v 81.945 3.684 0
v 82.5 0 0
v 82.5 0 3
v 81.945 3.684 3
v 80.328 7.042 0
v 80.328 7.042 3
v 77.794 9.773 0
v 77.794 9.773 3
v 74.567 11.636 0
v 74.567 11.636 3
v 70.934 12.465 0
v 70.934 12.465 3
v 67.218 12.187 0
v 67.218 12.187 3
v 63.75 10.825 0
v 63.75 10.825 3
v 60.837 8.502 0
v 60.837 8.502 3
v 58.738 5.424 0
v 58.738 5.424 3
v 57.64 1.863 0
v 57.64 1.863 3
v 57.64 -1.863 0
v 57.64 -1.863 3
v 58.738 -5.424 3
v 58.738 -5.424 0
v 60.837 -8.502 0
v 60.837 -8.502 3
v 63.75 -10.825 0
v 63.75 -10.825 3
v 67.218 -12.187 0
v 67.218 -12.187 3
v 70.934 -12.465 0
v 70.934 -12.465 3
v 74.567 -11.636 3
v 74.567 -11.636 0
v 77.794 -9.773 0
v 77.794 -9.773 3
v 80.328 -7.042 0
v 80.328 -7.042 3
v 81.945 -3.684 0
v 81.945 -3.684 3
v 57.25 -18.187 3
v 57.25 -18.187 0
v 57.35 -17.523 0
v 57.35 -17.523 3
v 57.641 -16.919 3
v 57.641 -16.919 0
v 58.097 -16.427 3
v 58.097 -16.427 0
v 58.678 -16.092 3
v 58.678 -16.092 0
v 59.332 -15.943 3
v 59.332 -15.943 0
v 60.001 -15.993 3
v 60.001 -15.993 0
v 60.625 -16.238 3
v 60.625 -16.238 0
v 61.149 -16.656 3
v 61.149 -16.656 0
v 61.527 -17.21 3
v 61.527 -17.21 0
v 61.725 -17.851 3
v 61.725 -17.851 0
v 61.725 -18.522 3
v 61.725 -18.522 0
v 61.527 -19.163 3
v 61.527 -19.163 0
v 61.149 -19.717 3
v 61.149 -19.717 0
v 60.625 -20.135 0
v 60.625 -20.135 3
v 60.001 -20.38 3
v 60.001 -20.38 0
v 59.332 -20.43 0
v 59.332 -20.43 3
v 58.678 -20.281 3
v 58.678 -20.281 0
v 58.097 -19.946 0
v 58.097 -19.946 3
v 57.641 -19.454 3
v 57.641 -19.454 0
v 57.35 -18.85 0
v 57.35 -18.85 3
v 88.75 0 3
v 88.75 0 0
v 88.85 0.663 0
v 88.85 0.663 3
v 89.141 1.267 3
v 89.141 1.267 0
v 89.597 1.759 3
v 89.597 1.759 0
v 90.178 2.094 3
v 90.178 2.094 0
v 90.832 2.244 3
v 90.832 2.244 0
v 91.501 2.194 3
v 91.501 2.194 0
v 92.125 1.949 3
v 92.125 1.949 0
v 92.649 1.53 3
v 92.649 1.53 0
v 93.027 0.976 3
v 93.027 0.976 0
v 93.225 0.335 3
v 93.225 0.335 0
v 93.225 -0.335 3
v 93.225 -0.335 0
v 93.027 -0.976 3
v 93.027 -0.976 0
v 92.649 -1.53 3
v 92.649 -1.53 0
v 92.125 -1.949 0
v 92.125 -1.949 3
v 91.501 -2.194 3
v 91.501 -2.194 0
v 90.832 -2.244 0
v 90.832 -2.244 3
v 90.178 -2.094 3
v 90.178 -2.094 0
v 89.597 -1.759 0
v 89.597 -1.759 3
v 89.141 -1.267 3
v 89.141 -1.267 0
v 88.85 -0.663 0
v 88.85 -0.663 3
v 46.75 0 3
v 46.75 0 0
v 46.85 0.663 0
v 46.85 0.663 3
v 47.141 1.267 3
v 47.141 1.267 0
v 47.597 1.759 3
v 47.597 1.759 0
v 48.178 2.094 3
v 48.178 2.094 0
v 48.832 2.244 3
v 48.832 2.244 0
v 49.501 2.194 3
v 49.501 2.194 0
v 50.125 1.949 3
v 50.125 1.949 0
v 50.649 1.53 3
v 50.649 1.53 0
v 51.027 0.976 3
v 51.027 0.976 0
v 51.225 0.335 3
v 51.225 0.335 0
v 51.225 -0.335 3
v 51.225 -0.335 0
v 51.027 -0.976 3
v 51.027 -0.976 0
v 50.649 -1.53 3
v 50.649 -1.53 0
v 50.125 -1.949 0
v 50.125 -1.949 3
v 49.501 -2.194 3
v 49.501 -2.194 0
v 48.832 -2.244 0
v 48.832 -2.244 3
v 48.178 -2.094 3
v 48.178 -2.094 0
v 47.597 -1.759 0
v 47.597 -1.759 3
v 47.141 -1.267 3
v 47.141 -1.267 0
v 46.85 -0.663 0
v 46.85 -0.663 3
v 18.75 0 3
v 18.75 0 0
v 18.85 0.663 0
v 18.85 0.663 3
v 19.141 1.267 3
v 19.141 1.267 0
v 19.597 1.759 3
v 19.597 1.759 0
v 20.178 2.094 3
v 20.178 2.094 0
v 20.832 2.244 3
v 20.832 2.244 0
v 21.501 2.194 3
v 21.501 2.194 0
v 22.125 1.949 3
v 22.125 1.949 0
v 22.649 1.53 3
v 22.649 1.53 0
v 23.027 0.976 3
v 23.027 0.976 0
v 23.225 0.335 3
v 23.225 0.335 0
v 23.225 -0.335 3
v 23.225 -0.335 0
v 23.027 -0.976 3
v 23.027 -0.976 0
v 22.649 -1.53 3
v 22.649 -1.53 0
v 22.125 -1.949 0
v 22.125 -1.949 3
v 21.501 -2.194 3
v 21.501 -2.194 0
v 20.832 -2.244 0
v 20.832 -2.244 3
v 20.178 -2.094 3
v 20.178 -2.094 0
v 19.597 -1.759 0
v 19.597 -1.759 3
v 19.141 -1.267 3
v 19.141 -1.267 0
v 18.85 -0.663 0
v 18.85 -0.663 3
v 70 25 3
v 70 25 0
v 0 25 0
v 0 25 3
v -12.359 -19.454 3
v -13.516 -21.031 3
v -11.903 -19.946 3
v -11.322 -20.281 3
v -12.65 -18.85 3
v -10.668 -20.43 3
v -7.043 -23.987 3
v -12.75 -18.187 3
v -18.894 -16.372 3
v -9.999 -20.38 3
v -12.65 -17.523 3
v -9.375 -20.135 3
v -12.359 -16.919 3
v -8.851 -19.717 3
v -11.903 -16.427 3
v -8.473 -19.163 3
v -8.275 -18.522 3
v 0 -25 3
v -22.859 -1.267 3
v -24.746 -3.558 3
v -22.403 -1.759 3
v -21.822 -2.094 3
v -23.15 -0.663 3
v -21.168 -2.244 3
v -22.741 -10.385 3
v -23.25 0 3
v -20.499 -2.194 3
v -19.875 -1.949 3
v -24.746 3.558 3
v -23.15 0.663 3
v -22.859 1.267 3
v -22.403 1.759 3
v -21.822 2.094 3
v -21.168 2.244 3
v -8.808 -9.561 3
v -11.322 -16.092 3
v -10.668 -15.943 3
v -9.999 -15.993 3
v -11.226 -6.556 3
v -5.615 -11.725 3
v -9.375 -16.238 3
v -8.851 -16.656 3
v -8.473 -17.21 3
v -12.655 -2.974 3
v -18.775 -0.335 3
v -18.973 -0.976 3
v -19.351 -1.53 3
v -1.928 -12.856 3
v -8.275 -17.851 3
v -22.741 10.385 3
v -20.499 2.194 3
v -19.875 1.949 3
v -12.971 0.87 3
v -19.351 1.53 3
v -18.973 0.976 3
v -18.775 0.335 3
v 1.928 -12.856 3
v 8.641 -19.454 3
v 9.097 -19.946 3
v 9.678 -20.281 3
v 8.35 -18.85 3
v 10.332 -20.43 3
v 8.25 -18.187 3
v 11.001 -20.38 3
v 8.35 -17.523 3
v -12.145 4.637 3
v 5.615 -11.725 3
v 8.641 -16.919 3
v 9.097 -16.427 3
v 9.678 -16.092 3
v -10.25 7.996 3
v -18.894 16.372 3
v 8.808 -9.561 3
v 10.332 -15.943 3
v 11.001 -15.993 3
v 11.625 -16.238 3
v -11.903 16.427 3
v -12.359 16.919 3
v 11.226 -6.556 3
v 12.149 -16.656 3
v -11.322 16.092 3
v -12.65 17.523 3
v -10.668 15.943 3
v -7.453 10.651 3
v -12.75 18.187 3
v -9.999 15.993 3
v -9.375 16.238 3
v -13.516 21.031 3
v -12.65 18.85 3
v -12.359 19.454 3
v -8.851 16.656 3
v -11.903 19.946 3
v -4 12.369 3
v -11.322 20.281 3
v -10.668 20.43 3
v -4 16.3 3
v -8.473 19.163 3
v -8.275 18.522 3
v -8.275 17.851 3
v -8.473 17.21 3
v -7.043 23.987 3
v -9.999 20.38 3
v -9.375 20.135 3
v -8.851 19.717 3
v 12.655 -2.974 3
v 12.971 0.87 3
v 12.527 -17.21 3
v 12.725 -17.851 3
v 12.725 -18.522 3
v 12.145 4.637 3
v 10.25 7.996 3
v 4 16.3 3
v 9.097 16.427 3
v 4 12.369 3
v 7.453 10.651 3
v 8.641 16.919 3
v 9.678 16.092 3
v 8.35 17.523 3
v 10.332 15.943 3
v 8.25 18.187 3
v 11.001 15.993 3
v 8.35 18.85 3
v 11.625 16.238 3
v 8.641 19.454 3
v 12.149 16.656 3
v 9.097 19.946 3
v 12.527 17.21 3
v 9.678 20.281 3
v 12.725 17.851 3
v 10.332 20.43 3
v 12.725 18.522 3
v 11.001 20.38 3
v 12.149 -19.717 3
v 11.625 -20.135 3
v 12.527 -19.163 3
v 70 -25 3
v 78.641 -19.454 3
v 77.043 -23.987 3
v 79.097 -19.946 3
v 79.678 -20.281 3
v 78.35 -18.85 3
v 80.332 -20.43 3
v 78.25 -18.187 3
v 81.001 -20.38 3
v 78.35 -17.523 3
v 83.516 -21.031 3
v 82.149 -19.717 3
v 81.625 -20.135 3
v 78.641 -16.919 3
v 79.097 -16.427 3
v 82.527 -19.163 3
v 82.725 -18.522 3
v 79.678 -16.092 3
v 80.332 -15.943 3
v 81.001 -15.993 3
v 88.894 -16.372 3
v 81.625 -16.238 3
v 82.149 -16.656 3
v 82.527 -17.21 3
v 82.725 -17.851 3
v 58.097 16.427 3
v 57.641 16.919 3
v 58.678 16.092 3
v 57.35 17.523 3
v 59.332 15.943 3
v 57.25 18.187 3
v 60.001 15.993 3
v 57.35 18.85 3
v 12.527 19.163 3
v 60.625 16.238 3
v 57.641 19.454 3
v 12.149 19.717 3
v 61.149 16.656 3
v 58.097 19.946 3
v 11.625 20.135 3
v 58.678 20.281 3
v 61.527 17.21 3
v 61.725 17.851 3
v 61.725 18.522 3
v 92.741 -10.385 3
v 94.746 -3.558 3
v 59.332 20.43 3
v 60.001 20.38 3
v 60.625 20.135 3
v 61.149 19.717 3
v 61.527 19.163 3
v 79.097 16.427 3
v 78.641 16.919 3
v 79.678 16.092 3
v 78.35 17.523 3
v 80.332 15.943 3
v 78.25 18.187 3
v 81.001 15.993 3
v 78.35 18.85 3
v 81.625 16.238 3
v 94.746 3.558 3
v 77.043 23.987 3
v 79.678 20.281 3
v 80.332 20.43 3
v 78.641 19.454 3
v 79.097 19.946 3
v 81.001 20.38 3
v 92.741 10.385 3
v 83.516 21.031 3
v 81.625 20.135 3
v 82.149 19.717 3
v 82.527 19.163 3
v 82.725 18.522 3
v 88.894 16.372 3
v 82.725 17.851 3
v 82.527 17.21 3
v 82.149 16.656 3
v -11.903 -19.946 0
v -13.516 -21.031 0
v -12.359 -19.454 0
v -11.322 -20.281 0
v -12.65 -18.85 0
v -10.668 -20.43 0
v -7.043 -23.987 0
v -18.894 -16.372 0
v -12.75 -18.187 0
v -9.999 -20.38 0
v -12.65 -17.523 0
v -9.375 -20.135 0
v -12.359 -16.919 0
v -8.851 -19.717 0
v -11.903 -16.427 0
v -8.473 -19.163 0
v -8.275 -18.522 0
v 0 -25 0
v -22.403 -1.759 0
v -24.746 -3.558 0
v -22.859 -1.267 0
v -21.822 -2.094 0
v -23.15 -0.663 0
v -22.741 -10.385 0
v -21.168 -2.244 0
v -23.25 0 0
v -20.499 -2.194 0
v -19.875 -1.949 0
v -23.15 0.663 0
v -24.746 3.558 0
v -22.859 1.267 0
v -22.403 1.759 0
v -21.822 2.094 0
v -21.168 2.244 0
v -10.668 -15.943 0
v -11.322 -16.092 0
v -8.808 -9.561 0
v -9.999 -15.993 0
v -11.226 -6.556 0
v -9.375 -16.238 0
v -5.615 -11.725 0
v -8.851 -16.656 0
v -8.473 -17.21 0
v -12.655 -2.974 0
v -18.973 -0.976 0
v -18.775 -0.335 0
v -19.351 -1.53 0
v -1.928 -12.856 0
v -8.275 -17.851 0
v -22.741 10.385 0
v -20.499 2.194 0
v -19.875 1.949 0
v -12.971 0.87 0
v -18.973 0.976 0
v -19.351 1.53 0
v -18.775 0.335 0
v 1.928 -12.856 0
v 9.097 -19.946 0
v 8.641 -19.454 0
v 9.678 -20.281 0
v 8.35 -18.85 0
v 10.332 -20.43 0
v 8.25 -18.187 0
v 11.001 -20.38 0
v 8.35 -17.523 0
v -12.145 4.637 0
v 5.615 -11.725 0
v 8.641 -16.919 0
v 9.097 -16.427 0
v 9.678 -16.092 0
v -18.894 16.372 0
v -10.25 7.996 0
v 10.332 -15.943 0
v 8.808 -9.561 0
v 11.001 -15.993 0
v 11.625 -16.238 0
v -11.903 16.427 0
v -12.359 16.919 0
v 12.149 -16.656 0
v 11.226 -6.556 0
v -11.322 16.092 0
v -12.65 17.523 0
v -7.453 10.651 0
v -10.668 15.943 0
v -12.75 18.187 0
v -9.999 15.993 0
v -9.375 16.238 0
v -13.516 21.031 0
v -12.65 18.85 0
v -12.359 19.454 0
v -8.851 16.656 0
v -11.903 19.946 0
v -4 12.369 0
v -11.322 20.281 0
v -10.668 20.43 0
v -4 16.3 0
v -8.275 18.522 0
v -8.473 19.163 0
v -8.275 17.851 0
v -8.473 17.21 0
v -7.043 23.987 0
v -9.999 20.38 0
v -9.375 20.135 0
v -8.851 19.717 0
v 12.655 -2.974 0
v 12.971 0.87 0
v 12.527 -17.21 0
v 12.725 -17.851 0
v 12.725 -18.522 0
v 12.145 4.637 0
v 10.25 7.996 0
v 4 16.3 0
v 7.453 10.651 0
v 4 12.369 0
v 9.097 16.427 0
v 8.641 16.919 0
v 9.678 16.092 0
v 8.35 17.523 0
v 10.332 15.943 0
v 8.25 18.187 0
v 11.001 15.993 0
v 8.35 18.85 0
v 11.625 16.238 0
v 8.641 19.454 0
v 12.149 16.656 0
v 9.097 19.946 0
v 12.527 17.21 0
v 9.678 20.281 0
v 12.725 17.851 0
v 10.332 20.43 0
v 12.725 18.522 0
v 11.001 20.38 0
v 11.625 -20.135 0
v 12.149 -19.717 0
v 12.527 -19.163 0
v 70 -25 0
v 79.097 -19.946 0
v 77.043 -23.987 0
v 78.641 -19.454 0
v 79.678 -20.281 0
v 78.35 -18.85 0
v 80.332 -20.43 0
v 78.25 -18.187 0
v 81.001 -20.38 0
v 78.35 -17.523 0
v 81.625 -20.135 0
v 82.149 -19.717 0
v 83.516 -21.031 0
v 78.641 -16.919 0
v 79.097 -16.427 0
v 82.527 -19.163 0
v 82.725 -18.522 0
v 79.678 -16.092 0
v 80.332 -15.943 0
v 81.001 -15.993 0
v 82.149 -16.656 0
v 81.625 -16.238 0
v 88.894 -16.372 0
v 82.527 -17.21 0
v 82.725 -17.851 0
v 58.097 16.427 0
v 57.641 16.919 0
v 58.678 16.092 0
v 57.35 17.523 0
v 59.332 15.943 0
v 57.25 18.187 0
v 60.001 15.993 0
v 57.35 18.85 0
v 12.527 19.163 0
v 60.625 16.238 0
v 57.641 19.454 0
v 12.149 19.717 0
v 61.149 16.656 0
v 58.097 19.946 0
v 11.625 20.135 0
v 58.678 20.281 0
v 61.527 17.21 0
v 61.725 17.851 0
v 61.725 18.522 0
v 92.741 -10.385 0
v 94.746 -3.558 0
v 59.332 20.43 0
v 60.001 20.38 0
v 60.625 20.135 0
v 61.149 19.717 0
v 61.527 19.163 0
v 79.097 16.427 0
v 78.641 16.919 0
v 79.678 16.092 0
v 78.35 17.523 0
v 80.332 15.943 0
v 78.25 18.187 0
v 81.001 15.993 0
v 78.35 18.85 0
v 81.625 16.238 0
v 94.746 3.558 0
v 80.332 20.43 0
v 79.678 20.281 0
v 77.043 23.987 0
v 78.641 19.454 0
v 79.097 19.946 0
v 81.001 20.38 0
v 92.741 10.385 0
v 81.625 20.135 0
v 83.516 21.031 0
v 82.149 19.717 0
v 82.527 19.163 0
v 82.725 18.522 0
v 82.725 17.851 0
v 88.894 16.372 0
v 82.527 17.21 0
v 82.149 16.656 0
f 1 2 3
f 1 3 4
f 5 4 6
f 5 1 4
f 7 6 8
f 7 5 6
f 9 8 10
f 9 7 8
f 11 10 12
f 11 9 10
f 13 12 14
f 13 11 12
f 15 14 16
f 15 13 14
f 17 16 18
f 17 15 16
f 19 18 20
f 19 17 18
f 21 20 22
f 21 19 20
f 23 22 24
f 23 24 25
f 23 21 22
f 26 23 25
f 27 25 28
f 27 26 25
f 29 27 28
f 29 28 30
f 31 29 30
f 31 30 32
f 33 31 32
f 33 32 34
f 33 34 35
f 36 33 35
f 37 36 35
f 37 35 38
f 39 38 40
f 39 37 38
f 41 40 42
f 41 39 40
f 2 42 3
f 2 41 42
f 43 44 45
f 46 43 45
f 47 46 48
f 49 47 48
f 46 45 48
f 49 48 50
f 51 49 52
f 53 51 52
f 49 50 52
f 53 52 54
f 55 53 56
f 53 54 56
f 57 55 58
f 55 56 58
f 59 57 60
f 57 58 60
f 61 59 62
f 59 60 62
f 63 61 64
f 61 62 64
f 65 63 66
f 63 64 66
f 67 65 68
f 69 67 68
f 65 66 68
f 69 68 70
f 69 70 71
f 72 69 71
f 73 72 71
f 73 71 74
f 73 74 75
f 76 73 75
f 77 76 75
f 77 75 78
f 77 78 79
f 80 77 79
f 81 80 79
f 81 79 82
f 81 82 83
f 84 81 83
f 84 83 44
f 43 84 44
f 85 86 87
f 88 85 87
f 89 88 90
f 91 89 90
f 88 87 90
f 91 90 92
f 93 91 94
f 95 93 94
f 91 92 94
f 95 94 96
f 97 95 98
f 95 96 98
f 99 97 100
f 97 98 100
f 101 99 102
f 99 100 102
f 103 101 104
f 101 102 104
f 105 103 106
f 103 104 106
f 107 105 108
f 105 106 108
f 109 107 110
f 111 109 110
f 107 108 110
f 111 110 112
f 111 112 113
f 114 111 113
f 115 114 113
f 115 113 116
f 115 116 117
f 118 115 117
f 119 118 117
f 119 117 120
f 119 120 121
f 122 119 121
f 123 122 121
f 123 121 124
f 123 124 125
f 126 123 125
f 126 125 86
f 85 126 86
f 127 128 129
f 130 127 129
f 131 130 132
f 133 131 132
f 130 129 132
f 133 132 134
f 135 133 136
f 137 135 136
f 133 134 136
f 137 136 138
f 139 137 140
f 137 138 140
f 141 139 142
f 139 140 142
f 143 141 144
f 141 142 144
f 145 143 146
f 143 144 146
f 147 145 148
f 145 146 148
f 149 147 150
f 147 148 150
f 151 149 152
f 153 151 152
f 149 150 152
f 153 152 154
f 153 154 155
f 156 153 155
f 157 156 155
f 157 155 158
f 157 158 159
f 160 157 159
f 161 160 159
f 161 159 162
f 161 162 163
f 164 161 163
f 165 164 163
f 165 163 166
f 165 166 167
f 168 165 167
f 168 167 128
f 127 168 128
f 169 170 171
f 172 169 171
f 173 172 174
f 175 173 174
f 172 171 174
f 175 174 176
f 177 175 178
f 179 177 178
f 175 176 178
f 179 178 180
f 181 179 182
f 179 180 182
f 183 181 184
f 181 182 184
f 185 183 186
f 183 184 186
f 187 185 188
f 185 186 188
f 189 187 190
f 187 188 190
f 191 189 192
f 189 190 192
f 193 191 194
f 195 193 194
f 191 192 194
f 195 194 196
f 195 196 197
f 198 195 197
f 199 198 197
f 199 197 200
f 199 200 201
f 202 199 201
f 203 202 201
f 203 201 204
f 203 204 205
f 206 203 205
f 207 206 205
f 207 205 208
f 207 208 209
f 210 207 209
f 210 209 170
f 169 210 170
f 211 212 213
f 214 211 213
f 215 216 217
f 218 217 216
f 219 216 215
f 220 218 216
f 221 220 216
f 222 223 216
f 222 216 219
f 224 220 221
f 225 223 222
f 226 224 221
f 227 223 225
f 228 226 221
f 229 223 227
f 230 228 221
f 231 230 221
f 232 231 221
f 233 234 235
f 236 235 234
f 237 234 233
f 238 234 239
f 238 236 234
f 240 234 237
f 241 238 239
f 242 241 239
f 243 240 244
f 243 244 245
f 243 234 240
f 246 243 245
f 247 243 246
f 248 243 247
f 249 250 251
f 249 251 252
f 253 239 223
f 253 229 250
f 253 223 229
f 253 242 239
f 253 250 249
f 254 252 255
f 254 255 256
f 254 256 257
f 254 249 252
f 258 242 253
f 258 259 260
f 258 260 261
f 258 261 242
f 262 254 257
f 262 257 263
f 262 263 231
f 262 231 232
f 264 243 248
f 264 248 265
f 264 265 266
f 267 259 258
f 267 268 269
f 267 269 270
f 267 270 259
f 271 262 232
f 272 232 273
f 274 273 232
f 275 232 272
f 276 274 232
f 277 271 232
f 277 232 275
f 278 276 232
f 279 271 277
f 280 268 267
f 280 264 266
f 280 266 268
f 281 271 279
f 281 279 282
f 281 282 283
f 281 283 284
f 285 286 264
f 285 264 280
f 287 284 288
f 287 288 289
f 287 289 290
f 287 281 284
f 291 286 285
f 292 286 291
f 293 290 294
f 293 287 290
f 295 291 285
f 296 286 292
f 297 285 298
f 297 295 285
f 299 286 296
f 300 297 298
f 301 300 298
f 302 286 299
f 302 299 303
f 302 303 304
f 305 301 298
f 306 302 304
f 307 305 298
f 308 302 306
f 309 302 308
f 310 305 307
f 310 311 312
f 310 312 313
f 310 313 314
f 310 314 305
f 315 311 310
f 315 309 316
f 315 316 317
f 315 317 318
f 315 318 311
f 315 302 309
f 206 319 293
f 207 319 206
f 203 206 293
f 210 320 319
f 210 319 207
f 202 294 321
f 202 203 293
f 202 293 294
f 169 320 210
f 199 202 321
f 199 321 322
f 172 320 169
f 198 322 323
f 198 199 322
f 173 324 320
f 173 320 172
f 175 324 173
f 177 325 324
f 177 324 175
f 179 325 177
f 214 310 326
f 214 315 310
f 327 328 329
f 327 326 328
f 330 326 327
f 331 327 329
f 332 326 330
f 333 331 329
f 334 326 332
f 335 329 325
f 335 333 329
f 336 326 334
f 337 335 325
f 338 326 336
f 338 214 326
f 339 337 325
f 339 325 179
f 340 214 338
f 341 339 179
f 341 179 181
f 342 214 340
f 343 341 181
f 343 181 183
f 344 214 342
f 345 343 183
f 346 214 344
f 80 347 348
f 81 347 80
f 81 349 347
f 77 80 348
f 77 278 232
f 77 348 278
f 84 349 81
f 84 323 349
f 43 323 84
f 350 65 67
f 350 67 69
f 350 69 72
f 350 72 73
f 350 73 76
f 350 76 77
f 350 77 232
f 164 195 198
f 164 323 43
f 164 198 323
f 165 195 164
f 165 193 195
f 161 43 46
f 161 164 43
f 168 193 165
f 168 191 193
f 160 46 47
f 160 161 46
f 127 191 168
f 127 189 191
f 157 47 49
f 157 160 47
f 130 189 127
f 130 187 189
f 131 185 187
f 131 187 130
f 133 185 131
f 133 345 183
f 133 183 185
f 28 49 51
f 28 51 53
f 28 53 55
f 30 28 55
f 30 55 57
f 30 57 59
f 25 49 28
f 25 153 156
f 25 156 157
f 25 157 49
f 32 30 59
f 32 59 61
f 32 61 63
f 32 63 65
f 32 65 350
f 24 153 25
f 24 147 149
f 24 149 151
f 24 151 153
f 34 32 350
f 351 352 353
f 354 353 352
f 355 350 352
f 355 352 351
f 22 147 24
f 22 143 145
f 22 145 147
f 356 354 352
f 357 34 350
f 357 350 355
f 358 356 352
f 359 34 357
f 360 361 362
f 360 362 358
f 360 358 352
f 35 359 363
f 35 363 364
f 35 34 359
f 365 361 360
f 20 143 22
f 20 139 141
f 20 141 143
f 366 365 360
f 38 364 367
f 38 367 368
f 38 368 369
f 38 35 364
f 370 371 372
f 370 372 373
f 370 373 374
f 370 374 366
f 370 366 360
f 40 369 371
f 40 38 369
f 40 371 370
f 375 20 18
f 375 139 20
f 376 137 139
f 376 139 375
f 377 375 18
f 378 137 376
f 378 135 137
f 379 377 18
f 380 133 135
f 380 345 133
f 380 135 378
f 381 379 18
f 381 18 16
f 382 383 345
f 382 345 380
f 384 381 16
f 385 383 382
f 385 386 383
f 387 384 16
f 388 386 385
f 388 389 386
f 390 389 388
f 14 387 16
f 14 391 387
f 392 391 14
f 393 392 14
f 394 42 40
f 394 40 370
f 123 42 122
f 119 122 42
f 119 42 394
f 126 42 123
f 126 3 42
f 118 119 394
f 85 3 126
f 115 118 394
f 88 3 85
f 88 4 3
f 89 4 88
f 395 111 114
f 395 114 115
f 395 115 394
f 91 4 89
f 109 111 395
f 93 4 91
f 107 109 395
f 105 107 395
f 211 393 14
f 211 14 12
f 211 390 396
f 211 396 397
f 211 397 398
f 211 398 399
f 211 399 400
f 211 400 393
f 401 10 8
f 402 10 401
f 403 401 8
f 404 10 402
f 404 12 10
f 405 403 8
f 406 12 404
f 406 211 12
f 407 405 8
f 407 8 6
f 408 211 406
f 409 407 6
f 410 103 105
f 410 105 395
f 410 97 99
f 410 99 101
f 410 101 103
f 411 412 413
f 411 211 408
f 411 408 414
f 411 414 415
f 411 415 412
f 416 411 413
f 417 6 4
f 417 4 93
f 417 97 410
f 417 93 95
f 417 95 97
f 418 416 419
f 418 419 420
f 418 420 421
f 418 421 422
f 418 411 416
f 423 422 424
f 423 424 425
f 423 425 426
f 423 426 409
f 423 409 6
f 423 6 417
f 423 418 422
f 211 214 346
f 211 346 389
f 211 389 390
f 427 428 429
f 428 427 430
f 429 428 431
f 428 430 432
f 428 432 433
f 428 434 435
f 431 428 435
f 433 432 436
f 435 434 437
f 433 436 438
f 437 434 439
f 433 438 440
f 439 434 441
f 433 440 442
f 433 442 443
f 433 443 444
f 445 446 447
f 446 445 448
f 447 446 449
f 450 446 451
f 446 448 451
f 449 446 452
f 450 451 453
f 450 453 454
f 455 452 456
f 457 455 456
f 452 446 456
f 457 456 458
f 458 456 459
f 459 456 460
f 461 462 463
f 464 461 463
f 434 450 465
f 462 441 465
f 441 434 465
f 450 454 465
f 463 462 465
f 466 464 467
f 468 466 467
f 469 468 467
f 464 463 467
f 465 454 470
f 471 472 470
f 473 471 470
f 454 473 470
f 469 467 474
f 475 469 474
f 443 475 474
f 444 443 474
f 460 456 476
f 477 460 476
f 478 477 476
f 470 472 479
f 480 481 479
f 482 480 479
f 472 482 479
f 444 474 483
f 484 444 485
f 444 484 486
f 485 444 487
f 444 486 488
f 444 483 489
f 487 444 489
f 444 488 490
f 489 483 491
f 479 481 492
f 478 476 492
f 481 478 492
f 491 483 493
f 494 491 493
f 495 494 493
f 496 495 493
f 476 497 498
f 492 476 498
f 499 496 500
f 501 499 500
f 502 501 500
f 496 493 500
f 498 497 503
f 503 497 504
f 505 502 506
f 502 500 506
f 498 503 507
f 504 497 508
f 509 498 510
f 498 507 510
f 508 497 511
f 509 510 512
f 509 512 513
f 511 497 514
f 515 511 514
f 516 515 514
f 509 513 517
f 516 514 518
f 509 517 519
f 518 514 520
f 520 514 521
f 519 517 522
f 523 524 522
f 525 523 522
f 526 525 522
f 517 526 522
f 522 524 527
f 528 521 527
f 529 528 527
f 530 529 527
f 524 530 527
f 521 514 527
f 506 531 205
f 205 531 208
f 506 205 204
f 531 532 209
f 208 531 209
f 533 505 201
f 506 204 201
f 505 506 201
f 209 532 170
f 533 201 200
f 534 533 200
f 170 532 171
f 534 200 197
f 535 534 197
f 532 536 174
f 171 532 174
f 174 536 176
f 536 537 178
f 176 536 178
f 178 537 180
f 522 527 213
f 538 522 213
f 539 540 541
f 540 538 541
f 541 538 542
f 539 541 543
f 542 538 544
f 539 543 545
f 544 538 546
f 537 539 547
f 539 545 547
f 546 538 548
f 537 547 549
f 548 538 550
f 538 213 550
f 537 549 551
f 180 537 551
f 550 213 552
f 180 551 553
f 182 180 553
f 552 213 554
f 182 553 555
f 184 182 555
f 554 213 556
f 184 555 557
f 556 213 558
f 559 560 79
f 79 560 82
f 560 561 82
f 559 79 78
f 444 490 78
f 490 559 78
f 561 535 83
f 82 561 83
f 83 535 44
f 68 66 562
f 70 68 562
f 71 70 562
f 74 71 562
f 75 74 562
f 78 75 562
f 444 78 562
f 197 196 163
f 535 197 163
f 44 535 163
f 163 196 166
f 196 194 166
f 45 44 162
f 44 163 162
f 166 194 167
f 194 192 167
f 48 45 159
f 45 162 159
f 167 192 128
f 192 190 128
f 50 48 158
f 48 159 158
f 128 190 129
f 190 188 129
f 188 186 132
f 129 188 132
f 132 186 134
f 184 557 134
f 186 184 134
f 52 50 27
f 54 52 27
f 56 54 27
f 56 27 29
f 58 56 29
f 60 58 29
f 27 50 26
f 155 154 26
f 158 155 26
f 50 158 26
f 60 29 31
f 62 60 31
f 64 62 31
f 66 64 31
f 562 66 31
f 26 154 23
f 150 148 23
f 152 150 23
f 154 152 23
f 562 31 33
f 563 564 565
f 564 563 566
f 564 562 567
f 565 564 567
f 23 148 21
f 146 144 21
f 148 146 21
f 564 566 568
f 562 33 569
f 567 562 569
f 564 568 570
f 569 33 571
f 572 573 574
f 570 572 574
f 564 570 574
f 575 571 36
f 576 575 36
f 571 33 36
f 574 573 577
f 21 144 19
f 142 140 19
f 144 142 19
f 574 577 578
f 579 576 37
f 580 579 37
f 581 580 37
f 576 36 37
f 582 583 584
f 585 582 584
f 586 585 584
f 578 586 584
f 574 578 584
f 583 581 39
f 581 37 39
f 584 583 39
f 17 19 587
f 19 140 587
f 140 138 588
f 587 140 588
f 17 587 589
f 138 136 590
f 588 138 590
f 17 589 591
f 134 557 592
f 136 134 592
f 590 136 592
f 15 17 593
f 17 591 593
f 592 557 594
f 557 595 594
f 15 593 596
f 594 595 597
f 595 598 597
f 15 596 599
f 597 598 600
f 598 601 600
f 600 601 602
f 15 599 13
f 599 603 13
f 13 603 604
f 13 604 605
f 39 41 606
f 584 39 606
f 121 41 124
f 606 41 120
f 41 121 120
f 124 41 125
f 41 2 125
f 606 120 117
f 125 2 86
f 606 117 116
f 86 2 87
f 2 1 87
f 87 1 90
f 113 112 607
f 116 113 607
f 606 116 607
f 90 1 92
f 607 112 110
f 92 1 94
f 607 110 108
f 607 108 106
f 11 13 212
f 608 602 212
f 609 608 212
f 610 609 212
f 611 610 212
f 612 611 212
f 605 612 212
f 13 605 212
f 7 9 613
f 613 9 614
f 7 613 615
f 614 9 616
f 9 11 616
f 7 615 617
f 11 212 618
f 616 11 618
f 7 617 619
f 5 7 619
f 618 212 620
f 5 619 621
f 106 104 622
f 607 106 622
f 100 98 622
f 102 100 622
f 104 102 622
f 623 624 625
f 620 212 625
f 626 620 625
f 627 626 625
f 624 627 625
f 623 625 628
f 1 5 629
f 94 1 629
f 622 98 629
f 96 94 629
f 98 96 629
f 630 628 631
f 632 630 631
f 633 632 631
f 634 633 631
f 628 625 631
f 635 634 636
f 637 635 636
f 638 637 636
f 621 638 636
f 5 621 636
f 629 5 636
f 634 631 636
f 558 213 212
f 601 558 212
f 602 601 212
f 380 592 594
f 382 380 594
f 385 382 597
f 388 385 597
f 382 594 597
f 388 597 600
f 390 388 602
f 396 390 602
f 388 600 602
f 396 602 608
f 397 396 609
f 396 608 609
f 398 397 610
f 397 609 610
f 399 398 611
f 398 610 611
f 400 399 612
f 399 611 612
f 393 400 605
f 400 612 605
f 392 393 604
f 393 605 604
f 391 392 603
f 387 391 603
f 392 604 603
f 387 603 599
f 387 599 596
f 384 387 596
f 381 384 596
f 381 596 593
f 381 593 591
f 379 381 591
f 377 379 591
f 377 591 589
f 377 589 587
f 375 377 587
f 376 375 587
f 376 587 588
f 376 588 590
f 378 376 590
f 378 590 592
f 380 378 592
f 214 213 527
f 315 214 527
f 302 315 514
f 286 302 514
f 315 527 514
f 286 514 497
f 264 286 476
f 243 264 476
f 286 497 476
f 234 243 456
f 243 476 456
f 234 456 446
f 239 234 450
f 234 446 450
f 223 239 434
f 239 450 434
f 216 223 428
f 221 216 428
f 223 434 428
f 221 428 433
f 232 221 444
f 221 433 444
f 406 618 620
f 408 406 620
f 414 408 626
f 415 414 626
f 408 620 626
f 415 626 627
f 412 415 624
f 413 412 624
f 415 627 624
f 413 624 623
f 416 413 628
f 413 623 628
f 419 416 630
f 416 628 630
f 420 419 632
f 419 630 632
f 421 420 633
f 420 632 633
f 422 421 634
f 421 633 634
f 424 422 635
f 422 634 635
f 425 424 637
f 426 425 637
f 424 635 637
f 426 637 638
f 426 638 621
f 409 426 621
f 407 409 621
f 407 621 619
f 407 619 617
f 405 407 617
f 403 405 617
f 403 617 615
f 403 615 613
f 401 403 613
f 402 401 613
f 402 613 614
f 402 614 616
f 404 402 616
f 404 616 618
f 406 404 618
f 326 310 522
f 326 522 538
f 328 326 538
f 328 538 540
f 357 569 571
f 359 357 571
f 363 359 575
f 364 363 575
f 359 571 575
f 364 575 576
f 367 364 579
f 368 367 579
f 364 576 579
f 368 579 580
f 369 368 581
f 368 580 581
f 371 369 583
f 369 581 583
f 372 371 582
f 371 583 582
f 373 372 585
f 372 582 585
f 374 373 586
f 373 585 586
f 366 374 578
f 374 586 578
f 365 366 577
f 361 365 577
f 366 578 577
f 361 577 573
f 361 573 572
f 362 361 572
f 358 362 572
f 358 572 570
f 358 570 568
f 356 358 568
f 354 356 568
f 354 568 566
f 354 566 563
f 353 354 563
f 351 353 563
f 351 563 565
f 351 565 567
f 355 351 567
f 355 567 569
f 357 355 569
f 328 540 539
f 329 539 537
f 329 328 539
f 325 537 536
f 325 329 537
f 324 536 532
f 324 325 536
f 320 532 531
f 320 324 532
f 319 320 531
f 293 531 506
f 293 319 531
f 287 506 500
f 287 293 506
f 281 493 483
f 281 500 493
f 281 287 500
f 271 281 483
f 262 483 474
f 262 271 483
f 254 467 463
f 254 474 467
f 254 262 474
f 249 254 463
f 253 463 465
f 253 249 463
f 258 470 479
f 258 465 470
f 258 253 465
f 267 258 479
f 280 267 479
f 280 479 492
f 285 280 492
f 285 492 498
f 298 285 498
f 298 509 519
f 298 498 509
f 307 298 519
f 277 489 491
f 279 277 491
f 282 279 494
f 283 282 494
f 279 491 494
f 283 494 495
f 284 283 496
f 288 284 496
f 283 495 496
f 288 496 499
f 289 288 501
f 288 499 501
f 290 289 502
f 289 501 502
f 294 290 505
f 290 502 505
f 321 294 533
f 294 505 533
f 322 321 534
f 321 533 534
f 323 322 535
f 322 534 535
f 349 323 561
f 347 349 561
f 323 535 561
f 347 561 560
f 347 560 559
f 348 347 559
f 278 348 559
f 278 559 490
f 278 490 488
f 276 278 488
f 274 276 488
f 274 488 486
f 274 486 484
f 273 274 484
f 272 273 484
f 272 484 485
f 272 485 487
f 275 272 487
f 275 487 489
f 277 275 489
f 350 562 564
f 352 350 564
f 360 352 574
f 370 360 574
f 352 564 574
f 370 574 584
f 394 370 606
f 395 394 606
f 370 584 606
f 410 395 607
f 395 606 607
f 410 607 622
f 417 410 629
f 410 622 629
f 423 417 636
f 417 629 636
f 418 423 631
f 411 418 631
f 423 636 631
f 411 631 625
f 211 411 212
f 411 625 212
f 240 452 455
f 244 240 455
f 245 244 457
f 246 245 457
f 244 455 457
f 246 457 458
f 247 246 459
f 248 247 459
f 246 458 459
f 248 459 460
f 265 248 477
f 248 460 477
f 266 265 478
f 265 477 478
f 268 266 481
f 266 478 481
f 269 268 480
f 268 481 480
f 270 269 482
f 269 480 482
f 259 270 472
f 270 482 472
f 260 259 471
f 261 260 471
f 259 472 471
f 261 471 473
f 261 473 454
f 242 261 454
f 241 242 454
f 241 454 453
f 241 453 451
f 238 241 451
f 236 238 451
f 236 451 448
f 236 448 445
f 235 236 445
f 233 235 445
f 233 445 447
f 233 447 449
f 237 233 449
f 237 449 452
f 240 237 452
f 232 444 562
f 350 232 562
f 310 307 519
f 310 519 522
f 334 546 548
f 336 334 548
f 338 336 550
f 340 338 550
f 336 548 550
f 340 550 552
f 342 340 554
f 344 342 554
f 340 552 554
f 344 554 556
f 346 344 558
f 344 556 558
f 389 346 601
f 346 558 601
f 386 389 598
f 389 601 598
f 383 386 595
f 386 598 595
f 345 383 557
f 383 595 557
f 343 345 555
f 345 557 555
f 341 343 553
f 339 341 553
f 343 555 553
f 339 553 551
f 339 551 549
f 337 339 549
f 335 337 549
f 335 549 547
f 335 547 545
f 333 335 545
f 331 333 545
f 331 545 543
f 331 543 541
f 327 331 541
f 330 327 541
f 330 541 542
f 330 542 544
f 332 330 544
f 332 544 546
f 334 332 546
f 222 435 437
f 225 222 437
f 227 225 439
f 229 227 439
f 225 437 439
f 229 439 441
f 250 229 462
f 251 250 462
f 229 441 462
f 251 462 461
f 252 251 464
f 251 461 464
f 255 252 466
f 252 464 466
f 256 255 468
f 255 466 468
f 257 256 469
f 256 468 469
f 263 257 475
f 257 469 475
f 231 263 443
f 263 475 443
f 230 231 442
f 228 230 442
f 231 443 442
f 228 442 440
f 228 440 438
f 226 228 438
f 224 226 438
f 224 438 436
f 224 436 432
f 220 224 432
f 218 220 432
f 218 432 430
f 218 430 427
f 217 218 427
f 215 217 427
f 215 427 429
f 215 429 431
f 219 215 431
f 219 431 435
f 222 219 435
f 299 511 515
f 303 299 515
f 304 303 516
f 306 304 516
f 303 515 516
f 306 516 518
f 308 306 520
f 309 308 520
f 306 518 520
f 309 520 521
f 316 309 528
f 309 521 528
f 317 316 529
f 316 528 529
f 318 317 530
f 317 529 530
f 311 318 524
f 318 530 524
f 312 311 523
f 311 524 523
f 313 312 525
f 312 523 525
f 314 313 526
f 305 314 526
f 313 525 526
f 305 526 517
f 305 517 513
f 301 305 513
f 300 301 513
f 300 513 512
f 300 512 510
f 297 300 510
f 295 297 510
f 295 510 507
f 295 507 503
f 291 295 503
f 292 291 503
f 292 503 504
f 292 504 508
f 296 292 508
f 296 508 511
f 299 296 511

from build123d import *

# Parameters (mm, degrees)
CROQUIS1_R                   = 12.5
SALIENTE_EXTRUIR1_DEPTH      = 3
TALADRO_DE_MARGEN_PARA_M42_D = 4.5
KEYWAY_DEPTH                 = 4


with BuildPart() as part:
    # Croquis1 → Saliente-Extruir1 (new body)
    with BuildSketch(Plane.XY):
        with BuildLine():
            Line((70, 25), (0, 25))
            ThreePointArc((0, 25), (-25, 0), (0, -25))
            Line((0, -25), (70, -25))
            ThreePointArc((70, -25), (95, 0), (70, 25))
        make_face()
        with Locations((70, 0)):
            Circle(CROQUIS1_R, mode=Mode.SUBTRACT)
    extrude(amount=SALIENTE_EXTRUIR1_DEPTH)

    # Taladro de margen para M42 (through all)
    with Locations(Plane.XY.offset(3)):
        with Locations((-21, 0), (91, 0), (-10.5, 18.186533479), (10.5, 18.186533479), (21, 0), (10.5, -18.186533479), (-10.5, -18.186533479), (80.5, -18.186533479), (59.5, -18.186533479), (49, 0), (59.5, 18.186533479), (80.5, 18.186533479)):
            Hole(TALADRO_DE_MARGEN_PARA_M42_D / 2)

    # KeySketch → Keyway (cut, through all)
    with BuildSketch(Plane(origin=(0.837491084, -0.474467987, 3), x_dir=(1, 0, 0), z_dir=(0, 0, 1))):
        with BuildLine():
            Line((-4.837491084, 12.843784864), (-4.837491084, 16.774467987))
            Line((-4.837491084, 16.774467987), (3.162508916, 16.774467987))
            Line((3.162508916, 16.774467987), (3.162508916, 12.843784864))
            ThreePointArc((3.162508916, 12.843784864), (-0.837491084, -12.525532013), (-4.837491084, 12.843784864))
        make_face()
    extrude(amount=-KEYWAY_DEPTH, mode=Mode.SUBTRACT)


solid = part.part
